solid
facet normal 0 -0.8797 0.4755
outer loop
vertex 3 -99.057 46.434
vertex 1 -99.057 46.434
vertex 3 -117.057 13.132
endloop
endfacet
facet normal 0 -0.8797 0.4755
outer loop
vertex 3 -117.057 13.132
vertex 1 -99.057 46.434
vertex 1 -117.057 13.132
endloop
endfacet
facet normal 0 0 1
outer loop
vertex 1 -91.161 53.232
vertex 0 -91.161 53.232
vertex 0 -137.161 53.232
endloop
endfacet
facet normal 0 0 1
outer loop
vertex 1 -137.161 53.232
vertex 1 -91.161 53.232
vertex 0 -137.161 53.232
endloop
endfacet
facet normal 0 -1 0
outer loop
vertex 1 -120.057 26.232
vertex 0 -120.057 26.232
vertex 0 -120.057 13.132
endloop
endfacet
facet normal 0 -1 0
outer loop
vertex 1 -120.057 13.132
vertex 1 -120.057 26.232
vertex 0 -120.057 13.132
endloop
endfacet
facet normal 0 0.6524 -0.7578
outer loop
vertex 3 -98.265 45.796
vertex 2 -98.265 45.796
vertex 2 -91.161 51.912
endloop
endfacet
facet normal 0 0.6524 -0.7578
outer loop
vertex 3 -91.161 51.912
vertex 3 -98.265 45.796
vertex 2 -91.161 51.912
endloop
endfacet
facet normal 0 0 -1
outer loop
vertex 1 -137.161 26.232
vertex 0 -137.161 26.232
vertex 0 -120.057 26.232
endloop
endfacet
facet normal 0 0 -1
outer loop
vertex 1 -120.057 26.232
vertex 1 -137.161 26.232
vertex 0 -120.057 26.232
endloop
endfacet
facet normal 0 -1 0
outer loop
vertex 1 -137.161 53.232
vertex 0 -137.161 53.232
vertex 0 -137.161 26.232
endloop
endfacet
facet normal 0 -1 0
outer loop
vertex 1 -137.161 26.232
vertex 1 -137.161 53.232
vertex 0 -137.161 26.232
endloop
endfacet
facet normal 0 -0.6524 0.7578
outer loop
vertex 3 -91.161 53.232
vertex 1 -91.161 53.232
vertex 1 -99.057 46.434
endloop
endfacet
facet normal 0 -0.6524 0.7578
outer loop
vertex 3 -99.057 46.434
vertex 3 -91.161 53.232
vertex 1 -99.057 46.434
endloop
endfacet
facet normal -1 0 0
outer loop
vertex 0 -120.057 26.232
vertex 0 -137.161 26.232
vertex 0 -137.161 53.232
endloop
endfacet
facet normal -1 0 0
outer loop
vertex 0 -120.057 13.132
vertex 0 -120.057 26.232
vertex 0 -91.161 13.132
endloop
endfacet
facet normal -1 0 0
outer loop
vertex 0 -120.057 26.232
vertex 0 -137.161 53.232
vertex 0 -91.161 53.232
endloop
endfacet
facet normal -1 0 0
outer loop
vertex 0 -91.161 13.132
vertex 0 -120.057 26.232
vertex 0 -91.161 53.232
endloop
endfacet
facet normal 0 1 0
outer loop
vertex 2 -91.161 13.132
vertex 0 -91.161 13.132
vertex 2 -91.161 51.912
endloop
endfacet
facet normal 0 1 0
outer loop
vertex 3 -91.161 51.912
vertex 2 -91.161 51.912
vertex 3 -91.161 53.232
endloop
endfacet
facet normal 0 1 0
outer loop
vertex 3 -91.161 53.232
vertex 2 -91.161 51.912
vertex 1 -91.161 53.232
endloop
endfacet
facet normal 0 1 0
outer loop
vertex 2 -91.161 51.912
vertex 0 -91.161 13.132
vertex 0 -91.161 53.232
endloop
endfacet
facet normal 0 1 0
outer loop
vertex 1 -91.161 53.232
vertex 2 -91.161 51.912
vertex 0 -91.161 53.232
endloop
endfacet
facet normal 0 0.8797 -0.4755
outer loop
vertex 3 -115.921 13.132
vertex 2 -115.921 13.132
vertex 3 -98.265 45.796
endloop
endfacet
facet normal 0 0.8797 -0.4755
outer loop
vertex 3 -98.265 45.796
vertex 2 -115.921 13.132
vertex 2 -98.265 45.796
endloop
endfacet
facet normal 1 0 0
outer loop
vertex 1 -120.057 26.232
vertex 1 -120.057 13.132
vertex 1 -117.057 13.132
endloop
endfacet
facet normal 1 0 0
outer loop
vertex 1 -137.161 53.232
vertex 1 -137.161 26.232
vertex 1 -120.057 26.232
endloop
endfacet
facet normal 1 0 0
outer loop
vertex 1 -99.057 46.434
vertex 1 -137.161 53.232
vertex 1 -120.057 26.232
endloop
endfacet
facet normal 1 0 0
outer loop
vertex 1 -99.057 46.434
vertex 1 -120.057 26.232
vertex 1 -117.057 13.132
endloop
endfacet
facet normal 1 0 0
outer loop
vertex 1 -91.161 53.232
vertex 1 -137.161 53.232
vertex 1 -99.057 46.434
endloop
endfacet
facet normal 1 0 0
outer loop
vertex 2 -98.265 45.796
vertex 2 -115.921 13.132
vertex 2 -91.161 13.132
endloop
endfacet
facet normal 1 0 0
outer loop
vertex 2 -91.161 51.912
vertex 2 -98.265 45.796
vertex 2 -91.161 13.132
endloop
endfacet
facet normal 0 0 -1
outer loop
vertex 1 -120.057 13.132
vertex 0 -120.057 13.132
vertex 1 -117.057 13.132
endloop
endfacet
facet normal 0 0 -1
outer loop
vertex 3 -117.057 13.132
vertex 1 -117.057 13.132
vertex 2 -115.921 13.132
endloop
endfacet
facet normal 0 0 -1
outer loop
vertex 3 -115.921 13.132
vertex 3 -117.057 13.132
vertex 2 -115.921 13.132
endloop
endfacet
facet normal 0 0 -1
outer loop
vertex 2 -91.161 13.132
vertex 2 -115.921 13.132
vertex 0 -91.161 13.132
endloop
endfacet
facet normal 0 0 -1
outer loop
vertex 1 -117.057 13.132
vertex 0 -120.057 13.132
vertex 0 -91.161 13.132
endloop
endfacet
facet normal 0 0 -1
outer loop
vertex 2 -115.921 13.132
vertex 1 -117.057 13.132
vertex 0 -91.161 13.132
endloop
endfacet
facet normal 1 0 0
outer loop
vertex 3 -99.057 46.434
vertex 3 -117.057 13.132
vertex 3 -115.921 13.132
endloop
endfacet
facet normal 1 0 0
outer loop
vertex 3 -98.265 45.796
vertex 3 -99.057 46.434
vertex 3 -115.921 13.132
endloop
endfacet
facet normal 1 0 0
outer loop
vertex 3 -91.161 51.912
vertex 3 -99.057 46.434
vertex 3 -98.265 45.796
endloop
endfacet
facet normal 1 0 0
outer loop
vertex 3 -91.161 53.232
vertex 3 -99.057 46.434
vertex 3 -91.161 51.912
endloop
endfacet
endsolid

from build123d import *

# Parameters (mm, degrees)
F1_DEPTH = 1
F2_DEPTH = 3
F3_DEPTH = 2


with BuildPart() as f1:
    # F0 (on Right) → F1 (new body)
    with BuildSketch(Plane.YZ):
        Polygon((-91.161479, 53.232064), (-137.161479, 53.232064), (-137.161479, 26.232064), (-127.161479, 26.232064), (-120.057479, 26.232064), (-120.057479, 13.132064), (-117.057479, 13.132064), (-99.057374, 46.433675), align=None)
    extrude(amount=F1_DEPTH)

    # F0 (on Right) → F2 (join)
    with BuildSketch(Plane.YZ):
        Polygon((-91.161479, 51.912471), (-91.161479, 53.232064), (-99.057374, 46.433675), (-117.057479, 13.132064), (-115.920747, 13.132064), (-98.265271, 45.796085), align=None)
    extrude(amount=F2_DEPTH)

    # F0 (on Right) → F3 (join)
    with BuildSketch(Plane.YZ):
        Polygon((-91.161479, 26.232064), (-91.161479, 51.912471), (-98.265271, 45.796085), (-115.920747, 13.132064), (-91.161479, 13.132064), align=None)
    extrude(amount=F3_DEPTH)


solid = f1.part
